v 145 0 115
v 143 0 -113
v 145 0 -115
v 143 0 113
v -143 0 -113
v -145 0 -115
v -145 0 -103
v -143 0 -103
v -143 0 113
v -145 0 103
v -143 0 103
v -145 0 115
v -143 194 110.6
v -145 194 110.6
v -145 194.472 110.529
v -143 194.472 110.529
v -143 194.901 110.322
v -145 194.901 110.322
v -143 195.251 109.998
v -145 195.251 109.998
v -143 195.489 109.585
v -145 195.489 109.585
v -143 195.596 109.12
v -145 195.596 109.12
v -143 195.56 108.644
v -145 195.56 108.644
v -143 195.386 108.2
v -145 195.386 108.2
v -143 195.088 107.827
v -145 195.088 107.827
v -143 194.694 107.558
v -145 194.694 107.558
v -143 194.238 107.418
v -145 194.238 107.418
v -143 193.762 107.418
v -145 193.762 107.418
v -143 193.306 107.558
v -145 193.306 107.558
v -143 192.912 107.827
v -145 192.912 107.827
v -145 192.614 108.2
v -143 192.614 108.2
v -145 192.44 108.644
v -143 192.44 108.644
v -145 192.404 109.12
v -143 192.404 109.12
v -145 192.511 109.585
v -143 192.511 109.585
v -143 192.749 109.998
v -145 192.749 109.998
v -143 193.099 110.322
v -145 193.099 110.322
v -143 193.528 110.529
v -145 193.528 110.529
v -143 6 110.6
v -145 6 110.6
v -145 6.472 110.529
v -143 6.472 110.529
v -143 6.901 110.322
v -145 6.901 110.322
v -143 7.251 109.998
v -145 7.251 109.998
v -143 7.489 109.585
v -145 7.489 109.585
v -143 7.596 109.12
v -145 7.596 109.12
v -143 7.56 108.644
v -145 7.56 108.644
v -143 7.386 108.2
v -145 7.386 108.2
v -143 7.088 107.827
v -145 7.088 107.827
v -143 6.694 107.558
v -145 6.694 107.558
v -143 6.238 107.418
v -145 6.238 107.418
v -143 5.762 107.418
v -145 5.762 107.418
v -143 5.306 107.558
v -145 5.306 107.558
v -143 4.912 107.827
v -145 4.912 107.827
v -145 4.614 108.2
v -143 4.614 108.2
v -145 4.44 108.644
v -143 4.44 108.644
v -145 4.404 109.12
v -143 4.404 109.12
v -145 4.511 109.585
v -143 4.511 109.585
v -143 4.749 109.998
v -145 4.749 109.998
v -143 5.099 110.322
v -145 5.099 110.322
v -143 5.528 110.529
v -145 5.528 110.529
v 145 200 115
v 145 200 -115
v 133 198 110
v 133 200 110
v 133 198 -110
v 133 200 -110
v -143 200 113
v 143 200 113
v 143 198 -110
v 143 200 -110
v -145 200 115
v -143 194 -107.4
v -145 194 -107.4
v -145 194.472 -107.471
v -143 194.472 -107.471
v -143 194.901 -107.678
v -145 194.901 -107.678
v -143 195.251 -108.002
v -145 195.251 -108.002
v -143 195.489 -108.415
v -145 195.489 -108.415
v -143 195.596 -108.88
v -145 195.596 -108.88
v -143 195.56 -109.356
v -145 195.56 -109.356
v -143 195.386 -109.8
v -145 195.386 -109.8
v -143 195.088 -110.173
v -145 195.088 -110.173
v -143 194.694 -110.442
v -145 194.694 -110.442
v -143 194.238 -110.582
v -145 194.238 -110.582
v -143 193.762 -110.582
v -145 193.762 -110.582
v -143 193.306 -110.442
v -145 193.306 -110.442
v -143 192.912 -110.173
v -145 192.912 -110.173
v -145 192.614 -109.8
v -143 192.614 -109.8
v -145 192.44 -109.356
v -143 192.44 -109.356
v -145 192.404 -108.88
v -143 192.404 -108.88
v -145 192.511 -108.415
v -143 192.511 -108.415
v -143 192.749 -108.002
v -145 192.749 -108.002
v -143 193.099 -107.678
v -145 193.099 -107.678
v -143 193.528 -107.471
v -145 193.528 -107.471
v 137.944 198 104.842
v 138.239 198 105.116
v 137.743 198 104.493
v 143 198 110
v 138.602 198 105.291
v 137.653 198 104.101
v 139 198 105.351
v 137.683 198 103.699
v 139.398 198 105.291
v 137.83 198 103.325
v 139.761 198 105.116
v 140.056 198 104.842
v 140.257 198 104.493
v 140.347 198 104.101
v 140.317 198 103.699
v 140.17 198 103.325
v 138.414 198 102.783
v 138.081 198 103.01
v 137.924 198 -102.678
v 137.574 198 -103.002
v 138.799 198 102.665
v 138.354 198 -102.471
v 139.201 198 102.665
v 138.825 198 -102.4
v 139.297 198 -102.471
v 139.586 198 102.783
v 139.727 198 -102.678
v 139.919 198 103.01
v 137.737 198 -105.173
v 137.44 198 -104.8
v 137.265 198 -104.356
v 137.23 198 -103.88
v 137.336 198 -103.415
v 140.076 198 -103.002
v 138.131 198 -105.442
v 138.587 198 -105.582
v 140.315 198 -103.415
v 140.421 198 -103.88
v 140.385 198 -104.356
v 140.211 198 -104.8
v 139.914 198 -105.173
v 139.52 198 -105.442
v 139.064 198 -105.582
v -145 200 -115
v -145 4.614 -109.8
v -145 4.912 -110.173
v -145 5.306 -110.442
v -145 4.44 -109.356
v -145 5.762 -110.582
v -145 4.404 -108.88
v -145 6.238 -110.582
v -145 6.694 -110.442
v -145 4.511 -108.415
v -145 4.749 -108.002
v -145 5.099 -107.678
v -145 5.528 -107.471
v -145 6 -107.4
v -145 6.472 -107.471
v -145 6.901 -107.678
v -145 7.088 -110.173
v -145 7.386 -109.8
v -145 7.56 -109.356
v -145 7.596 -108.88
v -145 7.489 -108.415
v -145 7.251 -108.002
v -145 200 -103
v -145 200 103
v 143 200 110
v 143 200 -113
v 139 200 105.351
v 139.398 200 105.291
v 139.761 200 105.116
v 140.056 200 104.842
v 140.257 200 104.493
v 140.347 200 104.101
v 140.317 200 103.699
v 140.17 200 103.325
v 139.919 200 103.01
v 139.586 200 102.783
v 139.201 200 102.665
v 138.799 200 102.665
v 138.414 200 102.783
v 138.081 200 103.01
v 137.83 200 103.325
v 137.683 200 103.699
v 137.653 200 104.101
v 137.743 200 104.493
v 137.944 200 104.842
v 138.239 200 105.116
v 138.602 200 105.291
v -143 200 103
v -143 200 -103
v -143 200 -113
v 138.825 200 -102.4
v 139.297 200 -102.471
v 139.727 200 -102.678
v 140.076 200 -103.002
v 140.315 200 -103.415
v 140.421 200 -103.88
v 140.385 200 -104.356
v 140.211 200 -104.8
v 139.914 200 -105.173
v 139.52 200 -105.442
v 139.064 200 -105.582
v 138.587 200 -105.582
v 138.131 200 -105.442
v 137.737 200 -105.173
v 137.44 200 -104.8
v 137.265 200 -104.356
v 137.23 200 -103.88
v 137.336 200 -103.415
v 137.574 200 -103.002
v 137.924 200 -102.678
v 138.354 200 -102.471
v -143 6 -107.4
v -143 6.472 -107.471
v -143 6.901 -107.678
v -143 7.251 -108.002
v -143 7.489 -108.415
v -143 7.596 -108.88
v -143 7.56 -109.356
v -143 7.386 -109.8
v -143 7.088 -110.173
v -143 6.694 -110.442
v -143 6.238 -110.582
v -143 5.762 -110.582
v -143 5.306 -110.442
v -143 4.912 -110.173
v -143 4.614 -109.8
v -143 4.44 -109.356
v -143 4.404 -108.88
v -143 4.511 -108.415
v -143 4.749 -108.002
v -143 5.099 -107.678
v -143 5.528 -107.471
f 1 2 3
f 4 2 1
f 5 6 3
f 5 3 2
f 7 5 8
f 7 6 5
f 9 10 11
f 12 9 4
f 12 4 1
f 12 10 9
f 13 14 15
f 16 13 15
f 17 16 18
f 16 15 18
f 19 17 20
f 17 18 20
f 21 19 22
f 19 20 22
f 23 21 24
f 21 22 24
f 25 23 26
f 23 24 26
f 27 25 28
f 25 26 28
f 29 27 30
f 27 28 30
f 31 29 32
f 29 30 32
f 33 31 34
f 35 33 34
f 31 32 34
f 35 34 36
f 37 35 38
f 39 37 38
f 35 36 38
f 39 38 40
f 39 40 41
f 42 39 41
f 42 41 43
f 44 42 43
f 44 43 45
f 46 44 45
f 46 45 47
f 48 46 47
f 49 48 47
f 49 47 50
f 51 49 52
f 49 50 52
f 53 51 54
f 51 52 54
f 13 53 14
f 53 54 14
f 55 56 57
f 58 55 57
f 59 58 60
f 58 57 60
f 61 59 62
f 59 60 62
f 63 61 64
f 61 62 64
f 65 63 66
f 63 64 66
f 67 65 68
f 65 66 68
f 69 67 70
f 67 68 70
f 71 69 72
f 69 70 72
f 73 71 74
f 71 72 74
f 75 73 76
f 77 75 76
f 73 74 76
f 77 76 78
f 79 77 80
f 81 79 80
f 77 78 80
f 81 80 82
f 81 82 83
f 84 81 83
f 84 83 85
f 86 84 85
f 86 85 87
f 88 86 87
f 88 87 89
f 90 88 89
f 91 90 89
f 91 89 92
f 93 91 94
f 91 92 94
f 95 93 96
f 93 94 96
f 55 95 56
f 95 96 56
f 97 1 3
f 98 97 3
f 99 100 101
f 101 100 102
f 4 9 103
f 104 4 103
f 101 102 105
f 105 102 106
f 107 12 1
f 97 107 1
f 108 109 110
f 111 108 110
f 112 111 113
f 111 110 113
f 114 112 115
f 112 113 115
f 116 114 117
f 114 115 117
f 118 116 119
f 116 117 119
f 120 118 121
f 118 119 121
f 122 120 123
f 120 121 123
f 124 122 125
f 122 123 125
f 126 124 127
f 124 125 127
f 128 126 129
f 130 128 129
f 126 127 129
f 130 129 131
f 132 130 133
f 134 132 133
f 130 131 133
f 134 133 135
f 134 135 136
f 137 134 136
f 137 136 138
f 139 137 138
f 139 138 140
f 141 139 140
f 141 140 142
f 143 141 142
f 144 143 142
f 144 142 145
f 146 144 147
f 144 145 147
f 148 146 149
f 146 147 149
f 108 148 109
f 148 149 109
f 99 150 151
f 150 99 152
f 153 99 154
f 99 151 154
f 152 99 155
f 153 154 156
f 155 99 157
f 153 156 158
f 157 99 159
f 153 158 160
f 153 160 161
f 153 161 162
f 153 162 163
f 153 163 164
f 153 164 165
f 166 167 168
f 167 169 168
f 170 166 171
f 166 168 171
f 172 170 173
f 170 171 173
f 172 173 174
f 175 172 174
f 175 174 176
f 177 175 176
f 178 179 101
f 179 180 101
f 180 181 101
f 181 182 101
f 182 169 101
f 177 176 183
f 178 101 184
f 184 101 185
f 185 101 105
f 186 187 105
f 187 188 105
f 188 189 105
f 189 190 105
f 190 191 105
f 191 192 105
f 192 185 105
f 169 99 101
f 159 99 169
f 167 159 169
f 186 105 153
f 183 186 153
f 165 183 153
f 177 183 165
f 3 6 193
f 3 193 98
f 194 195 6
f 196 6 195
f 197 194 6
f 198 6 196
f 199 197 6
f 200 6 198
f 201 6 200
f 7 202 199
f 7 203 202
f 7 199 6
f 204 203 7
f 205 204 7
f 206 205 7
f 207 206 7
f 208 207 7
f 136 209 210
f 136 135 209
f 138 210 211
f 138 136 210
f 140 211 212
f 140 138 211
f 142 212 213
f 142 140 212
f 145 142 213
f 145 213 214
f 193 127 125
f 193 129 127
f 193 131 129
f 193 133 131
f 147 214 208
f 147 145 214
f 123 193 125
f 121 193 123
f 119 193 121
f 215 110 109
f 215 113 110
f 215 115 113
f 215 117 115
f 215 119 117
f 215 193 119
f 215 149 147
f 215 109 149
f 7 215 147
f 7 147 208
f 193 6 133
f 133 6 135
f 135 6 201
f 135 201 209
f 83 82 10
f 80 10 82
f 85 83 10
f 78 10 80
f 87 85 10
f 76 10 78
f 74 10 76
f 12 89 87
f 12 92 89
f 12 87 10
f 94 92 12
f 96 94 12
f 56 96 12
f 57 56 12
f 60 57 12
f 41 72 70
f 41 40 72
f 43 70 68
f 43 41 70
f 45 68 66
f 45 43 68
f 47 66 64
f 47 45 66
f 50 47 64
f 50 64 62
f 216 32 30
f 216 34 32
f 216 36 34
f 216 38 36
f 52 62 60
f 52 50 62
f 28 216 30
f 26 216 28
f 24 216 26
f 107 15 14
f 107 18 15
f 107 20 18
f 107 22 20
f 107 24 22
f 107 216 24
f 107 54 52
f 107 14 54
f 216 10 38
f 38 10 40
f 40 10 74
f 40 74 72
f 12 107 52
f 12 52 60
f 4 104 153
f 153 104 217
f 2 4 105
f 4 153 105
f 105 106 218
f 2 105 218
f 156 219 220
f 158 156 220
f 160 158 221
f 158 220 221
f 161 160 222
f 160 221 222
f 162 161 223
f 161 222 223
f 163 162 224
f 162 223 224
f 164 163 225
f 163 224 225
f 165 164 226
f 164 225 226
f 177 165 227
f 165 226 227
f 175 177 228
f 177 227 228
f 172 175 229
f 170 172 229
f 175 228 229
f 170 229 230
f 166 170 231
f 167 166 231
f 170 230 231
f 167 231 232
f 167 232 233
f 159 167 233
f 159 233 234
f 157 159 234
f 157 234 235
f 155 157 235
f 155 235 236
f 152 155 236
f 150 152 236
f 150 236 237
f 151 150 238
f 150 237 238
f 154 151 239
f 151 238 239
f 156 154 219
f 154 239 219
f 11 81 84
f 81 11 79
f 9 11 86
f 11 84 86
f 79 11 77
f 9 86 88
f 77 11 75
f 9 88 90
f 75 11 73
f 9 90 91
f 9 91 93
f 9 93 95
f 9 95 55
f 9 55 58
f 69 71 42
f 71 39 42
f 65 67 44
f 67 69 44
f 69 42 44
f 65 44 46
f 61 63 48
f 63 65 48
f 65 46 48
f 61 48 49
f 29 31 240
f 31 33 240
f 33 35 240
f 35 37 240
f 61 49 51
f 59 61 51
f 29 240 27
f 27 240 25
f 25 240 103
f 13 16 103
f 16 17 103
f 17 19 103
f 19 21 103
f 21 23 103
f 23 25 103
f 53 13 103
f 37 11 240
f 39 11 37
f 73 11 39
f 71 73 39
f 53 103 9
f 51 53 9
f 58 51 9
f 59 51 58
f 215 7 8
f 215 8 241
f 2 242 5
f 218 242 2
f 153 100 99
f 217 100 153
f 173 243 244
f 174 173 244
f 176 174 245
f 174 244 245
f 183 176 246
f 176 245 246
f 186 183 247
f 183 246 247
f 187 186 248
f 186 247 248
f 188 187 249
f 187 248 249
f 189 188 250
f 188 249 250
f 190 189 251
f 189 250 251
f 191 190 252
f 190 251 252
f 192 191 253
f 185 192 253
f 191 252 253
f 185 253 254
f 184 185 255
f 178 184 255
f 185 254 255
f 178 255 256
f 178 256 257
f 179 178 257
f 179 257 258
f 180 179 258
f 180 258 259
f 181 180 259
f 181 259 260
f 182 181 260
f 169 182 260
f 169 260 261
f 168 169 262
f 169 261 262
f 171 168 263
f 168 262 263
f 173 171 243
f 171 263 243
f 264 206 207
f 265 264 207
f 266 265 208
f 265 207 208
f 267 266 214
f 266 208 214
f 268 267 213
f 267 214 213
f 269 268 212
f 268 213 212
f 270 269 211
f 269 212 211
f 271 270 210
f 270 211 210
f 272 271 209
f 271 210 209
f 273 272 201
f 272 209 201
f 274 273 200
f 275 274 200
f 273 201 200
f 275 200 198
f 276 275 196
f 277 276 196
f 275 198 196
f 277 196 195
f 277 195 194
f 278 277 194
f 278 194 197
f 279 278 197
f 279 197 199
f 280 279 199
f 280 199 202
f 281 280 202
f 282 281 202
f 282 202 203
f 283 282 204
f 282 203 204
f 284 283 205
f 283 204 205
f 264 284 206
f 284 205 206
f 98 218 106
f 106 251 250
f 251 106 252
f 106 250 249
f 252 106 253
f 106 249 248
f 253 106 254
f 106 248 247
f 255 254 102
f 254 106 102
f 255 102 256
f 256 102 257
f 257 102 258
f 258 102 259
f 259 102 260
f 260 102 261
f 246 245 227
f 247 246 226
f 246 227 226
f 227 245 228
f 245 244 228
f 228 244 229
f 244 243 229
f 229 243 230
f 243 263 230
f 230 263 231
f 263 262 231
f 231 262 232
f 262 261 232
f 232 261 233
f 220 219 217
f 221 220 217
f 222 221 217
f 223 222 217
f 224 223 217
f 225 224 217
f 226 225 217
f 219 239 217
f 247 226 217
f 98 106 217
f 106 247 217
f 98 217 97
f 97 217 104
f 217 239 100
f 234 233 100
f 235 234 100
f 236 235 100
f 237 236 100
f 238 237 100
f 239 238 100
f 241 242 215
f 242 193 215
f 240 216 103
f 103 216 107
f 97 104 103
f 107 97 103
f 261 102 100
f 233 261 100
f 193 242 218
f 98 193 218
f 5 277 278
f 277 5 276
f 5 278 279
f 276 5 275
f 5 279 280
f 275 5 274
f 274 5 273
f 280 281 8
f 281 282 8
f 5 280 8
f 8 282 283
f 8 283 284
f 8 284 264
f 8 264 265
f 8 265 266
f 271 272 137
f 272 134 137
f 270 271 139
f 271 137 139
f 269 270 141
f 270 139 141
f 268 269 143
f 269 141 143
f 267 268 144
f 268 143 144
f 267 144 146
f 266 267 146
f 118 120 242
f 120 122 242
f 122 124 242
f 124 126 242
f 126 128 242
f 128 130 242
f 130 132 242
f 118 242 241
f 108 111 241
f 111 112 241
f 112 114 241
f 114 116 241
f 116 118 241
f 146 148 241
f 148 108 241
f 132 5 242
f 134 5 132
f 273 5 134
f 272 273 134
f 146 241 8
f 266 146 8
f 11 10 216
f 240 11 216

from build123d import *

# Parameters (mm, degrees)
SKETCH_1_W          = 290
SKETCH_1_H          = 230
EXTRUDE_1_DEPTH     = 200
SKETCH_2_W          = 286
SKETCH_2_H          = 226
CUT_EXTRUDE_1_DEPTH = 200
SKETCH_3_W          = 226
SKETCH_3_H          = 200
CUT_EXTRUDE_2_DEPTH = 2
SKETCH_5_W          = 10
SKETCH_5_H          = 220
EXTRUDE_2_DEPTH     = 2
SKETCH_6_R          = 1.6
CUT_EXTRUDE_3_DEPTH = 2
SKETCH_7_R          = 1.350525158
CUT_EXTRUDE_4_DEPTH = 2
SKETCH_8_W          = 10
SKETCH_8_H          = 200
EXTRUDE_3_DEPTH     = 2
SKETCH_9_R          = 1.6
CUT_EXTRUDE_5_DEPTH = 2
SKETCH_10_R         = 1.6
CUT_EXTRUDE_6_DEPTH = 2
SKETCH_11_W         = 10
SKETCH_11_H         = 200
EXTRUDE_4_DEPTH     = 2
SKETCH_12_R         = 1.6
CUT_EXTRUDE_7_DEPTH = 2
SKETCH_13_R         = 1.6
CUT_EXTRUDE_8_DEPTH = 2


with BuildPart() as part:
    # 草图1 → 凸台-拉伸1 (new body)
    with BuildSketch(Plane(origin=(0, 0, 0), x_dir=(1, 0, 0), z_dir=(0, 1, 0))):
        Rectangle(SKETCH_1_W, SKETCH_1_H)
    extrude(amount=EXTRUDE_1_DEPTH)

    # 草图2 → 切除-拉伸1 (cut)
    with BuildSketch(Plane(origin=(0, 200, 0), x_dir=(1, 0, 0), z_dir=(0, 1, 0))):
        Rectangle(SKETCH_2_W, SKETCH_2_H)
    extrude(amount=-CUT_EXTRUDE_1_DEPTH, mode=Mode.SUBTRACT)

    # 草图3 → 切除-拉伸2 (cut)
    with BuildSketch(Plane.ZY.offset(145)):
        with Locations((0, 100)):
            Rectangle(SKETCH_3_W, SKETCH_3_H)
    extrude(amount=-CUT_EXTRUDE_2_DEPTH, mode=Mode.SUBTRACT)

    # 草图5 → 凸台-拉伸2 (add)
    with BuildSketch(Plane(origin=(0, 200, 0), x_dir=(1, 0, 0), z_dir=(0, 1, 0))):
        with Locations((138, 0)):
            Rectangle(SKETCH_5_W, SKETCH_5_H)
    extrude(amount=-EXTRUDE_2_DEPTH)

    # 草图6 → 切除-拉伸3 (cut)
    with BuildSketch(Plane(origin=(0, 200, 0), x_dir=(1, 0, 0), z_dir=(0, 1, 0))):
        with Locations(Location((138.825354176, 104, 0), (0, 0, 270))):
            Circle(SKETCH_6_R)
    extrude(amount=-CUT_EXTRUDE_3_DEPTH, mode=Mode.SUBTRACT)

    # 草图7 → 切除-拉伸4 (cut)
    with BuildSketch(Plane(origin=(0, 200, 0), x_dir=(1, 0, 0), z_dir=(0, 1, 0))):
        with Locations(Location((139, -104, 0), (0, 0, 270))):
            Circle(SKETCH_7_R)
    extrude(amount=-CUT_EXTRUDE_4_DEPTH, mode=Mode.SUBTRACT)

    # 草图8 → 凸台-拉伸3 (add)
    with BuildSketch(Plane.ZY.offset(145)):
        with Locations((108, 100)):
            Rectangle(SKETCH_8_W, SKETCH_8_H)
    extrude(amount=-EXTRUDE_3_DEPTH)

    # 草图9 → 切除-拉伸5 (cut)
    with BuildSketch(Plane.ZY.offset(145)):
        with Locations((109, 194)):
            Circle(SKETCH_9_R)
    extrude(amount=-CUT_EXTRUDE_5_DEPTH, mode=Mode.SUBTRACT)

    # 草图10 → 切除-拉伸6 (cut)
    with BuildSketch(Plane.ZY.offset(145)):
        with Locations((109, 6)):
            Circle(SKETCH_10_R)
    extrude(amount=-CUT_EXTRUDE_6_DEPTH, mode=Mode.SUBTRACT)

    # 草图11 → 凸台-拉伸4 (add)
    with BuildSketch(Plane.ZY.offset(145)):
        with Locations((-108, 100)):
            Rectangle(SKETCH_11_W, SKETCH_11_H)
    extrude(amount=-EXTRUDE_4_DEPTH)

    # 草图12 → 切除-拉伸7 (cut)
    with BuildSketch(Plane.ZY.offset(145)):
        with Locations((-109, 194)):
            Circle(SKETCH_12_R)
    extrude(amount=-CUT_EXTRUDE_7_DEPTH, mode=Mode.SUBTRACT)

    # 草图13 → 切除-拉伸8 (cut)
    with BuildSketch(Plane.ZY.offset(145)):
        with Locations((-109, 6)):
            Circle(SKETCH_13_R)
    extrude(amount=-CUT_EXTRUDE_8_DEPTH, mode=Mode.SUBTRACT)


solid = part.part
